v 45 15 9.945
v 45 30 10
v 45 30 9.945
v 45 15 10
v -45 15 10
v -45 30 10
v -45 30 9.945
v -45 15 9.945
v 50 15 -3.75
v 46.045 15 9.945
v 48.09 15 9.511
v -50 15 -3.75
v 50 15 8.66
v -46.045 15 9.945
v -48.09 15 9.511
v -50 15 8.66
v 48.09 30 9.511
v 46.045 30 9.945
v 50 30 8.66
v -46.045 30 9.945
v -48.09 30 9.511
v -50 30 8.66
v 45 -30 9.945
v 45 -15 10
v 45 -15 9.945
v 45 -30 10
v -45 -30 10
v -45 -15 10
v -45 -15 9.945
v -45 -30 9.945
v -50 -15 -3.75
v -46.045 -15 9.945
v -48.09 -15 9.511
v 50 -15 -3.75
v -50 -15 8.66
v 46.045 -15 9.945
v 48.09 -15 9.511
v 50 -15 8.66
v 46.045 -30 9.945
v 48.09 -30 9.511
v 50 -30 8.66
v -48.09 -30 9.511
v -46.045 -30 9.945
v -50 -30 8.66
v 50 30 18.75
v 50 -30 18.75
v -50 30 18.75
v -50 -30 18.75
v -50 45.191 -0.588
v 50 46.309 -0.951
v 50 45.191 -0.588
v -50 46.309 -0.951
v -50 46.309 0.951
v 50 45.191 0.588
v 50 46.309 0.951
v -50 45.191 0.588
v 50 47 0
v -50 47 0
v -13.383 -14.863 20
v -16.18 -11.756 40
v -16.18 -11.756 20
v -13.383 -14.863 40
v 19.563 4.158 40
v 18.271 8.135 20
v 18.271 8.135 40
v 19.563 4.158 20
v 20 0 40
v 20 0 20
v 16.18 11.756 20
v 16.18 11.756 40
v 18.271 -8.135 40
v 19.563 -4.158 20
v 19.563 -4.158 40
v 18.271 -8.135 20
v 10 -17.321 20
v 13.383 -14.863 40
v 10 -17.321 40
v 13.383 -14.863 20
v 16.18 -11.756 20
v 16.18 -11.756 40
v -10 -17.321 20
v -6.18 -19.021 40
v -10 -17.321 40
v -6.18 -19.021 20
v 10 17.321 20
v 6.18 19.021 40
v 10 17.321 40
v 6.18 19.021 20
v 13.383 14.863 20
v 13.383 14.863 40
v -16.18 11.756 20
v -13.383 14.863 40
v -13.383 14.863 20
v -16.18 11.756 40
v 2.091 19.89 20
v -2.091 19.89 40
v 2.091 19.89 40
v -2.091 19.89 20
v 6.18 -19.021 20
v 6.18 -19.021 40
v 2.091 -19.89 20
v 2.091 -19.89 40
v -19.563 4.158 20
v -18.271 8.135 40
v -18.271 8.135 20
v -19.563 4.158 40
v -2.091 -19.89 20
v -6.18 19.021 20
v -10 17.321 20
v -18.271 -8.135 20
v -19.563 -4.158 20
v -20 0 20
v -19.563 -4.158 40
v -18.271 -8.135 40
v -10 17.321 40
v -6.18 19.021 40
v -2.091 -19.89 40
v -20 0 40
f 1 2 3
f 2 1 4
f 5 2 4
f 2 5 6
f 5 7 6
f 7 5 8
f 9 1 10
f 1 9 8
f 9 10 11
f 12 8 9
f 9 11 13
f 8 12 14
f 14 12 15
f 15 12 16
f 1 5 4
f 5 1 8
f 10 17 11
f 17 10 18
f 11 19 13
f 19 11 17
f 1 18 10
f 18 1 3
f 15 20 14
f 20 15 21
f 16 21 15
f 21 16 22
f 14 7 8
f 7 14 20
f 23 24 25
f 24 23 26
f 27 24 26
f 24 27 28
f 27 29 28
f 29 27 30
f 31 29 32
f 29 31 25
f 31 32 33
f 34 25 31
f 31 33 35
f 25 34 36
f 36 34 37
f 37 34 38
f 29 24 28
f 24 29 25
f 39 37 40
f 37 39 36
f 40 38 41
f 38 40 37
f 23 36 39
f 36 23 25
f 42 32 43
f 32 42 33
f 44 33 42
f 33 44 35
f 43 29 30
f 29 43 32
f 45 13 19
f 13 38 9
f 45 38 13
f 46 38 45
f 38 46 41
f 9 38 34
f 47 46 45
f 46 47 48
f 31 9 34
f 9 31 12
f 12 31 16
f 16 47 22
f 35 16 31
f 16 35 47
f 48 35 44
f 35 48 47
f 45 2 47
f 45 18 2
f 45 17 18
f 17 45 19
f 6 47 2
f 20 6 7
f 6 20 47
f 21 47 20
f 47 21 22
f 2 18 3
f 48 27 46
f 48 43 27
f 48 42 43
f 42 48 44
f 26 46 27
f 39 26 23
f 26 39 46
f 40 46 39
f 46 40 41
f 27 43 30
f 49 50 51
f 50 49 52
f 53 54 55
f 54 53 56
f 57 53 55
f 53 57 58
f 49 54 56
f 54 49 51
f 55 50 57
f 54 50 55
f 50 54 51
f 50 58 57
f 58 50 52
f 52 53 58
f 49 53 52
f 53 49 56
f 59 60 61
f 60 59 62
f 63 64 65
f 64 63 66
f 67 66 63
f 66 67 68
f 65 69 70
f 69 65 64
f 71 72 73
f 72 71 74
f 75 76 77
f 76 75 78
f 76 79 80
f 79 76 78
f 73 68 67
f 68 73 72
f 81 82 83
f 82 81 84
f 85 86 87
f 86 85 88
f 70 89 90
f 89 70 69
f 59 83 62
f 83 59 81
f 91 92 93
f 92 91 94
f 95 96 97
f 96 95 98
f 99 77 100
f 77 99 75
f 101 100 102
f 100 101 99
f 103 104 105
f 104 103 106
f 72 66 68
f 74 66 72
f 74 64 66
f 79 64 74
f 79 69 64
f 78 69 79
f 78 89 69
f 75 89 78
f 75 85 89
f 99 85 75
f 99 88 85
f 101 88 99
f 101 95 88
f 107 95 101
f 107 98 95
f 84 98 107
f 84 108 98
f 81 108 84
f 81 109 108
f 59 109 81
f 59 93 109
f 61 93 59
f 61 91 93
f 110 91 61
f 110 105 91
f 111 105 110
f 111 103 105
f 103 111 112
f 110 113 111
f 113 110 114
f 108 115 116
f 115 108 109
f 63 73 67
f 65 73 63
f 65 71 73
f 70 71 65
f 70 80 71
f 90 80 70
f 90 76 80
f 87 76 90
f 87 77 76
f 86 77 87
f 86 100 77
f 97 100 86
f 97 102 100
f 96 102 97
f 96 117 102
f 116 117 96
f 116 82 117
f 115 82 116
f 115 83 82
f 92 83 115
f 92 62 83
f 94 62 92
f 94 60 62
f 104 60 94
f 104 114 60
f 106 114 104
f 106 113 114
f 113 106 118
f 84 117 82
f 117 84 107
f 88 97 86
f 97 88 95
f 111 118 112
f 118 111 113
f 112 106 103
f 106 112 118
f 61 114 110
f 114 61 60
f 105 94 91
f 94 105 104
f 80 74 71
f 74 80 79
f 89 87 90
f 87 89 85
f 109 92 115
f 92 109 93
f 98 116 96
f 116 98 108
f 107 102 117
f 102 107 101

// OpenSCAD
//Overall Tank Dimensions
tank_length = 100;
tank_width = 60;

//Parts Dimensions
hull_width = 0;
hull_height = 0;
tank_height = 30;
track_width = 30;
track_height = 20;
turret_height = 20;


track_length = tank_length * 0.9;




module track( ){
     cube( [ track_length, track_width, track_height  ], true );
     translate( [ track_length / 2,track_width / 2, 0 ] )
        wheel( track_width,track_height );
     translate( [ -track_length / 2, track_width/2, 0 ] )
        wheel(track_width,track_height);
}

module innertrack(){
     cube( [ track_length , track_width + 1, track_height * 0.8 ], true );
     translate( [ track_length / 2, track_width/2 + 2, 0 ] )
        wheel( track_width + 4,track_height * 0.8 );
     translate( [ -track_length / 2 , track_width/2 + 2, 0 ] )
        wheel(track_width + 4,track_height * 0.8 );
}

module wheel( width, diameter ){
    color("purple")
         rotate( [ 90, 0, 0 ] ){
         cylinder( h = width, r = diameter / 2 );
    } 
}

module fulltrack( ){

    difference(){
    track();
    color( "green") innertrack();
    }
    
    translate([ 0,track_width/2,0] ){
        wheel(track_width/2,track_height);
        translate( [ track_length/3 ,0, 0 ] )
        wheel(track_width/2,track_height);
        translate( [-track_length/3,0, 0 ] )
        wheel(track_width/2,track_height);
    }
} 

module tracks(){
    translate( [ 0, -tank_width / 2, 0 ] )
        mirror([0,1,0])
        fulltrack();
    
    translate( [ 0, tank_width / 2, 0 ] )
        fulltrack();  
}

module hull(){
    color("blue")
    difference(){
    translate( [ 0, 0, tank_height / 4 ] )
    cube( [ tank_length,tank_width ,3 * tank_height / 4 ], center = true);
      translate( [ 0, tank_width / 2, 0 ] )
        track();
      translate( [ 0, -tank_width / 2, 0 ] )
        track();
    }
}

module turret(){
    translate( [ 0, 0, tank_height  ] )
      cylinder( h = turret_height, r = tank_width/3, center = true  );
}

module leftedge()
{
    translate( [ 0, tank_width/4 + track_width + 1 , 0 ] )
         rotate( [ 90, 0, 90 ] )
            cylinder(  h = 100, r = 1, center = true );
}

module rightedge()
{
    translate( [ 0,  -tank_width/4 - track_width - 1 , 0 ] )
         rotate( [ 90, 0, 90 ] )
            cylinder(  h = 100, r = 1, center = true );
}



//tracks();
leftedge();
//rightedge();
hull();
turret();
